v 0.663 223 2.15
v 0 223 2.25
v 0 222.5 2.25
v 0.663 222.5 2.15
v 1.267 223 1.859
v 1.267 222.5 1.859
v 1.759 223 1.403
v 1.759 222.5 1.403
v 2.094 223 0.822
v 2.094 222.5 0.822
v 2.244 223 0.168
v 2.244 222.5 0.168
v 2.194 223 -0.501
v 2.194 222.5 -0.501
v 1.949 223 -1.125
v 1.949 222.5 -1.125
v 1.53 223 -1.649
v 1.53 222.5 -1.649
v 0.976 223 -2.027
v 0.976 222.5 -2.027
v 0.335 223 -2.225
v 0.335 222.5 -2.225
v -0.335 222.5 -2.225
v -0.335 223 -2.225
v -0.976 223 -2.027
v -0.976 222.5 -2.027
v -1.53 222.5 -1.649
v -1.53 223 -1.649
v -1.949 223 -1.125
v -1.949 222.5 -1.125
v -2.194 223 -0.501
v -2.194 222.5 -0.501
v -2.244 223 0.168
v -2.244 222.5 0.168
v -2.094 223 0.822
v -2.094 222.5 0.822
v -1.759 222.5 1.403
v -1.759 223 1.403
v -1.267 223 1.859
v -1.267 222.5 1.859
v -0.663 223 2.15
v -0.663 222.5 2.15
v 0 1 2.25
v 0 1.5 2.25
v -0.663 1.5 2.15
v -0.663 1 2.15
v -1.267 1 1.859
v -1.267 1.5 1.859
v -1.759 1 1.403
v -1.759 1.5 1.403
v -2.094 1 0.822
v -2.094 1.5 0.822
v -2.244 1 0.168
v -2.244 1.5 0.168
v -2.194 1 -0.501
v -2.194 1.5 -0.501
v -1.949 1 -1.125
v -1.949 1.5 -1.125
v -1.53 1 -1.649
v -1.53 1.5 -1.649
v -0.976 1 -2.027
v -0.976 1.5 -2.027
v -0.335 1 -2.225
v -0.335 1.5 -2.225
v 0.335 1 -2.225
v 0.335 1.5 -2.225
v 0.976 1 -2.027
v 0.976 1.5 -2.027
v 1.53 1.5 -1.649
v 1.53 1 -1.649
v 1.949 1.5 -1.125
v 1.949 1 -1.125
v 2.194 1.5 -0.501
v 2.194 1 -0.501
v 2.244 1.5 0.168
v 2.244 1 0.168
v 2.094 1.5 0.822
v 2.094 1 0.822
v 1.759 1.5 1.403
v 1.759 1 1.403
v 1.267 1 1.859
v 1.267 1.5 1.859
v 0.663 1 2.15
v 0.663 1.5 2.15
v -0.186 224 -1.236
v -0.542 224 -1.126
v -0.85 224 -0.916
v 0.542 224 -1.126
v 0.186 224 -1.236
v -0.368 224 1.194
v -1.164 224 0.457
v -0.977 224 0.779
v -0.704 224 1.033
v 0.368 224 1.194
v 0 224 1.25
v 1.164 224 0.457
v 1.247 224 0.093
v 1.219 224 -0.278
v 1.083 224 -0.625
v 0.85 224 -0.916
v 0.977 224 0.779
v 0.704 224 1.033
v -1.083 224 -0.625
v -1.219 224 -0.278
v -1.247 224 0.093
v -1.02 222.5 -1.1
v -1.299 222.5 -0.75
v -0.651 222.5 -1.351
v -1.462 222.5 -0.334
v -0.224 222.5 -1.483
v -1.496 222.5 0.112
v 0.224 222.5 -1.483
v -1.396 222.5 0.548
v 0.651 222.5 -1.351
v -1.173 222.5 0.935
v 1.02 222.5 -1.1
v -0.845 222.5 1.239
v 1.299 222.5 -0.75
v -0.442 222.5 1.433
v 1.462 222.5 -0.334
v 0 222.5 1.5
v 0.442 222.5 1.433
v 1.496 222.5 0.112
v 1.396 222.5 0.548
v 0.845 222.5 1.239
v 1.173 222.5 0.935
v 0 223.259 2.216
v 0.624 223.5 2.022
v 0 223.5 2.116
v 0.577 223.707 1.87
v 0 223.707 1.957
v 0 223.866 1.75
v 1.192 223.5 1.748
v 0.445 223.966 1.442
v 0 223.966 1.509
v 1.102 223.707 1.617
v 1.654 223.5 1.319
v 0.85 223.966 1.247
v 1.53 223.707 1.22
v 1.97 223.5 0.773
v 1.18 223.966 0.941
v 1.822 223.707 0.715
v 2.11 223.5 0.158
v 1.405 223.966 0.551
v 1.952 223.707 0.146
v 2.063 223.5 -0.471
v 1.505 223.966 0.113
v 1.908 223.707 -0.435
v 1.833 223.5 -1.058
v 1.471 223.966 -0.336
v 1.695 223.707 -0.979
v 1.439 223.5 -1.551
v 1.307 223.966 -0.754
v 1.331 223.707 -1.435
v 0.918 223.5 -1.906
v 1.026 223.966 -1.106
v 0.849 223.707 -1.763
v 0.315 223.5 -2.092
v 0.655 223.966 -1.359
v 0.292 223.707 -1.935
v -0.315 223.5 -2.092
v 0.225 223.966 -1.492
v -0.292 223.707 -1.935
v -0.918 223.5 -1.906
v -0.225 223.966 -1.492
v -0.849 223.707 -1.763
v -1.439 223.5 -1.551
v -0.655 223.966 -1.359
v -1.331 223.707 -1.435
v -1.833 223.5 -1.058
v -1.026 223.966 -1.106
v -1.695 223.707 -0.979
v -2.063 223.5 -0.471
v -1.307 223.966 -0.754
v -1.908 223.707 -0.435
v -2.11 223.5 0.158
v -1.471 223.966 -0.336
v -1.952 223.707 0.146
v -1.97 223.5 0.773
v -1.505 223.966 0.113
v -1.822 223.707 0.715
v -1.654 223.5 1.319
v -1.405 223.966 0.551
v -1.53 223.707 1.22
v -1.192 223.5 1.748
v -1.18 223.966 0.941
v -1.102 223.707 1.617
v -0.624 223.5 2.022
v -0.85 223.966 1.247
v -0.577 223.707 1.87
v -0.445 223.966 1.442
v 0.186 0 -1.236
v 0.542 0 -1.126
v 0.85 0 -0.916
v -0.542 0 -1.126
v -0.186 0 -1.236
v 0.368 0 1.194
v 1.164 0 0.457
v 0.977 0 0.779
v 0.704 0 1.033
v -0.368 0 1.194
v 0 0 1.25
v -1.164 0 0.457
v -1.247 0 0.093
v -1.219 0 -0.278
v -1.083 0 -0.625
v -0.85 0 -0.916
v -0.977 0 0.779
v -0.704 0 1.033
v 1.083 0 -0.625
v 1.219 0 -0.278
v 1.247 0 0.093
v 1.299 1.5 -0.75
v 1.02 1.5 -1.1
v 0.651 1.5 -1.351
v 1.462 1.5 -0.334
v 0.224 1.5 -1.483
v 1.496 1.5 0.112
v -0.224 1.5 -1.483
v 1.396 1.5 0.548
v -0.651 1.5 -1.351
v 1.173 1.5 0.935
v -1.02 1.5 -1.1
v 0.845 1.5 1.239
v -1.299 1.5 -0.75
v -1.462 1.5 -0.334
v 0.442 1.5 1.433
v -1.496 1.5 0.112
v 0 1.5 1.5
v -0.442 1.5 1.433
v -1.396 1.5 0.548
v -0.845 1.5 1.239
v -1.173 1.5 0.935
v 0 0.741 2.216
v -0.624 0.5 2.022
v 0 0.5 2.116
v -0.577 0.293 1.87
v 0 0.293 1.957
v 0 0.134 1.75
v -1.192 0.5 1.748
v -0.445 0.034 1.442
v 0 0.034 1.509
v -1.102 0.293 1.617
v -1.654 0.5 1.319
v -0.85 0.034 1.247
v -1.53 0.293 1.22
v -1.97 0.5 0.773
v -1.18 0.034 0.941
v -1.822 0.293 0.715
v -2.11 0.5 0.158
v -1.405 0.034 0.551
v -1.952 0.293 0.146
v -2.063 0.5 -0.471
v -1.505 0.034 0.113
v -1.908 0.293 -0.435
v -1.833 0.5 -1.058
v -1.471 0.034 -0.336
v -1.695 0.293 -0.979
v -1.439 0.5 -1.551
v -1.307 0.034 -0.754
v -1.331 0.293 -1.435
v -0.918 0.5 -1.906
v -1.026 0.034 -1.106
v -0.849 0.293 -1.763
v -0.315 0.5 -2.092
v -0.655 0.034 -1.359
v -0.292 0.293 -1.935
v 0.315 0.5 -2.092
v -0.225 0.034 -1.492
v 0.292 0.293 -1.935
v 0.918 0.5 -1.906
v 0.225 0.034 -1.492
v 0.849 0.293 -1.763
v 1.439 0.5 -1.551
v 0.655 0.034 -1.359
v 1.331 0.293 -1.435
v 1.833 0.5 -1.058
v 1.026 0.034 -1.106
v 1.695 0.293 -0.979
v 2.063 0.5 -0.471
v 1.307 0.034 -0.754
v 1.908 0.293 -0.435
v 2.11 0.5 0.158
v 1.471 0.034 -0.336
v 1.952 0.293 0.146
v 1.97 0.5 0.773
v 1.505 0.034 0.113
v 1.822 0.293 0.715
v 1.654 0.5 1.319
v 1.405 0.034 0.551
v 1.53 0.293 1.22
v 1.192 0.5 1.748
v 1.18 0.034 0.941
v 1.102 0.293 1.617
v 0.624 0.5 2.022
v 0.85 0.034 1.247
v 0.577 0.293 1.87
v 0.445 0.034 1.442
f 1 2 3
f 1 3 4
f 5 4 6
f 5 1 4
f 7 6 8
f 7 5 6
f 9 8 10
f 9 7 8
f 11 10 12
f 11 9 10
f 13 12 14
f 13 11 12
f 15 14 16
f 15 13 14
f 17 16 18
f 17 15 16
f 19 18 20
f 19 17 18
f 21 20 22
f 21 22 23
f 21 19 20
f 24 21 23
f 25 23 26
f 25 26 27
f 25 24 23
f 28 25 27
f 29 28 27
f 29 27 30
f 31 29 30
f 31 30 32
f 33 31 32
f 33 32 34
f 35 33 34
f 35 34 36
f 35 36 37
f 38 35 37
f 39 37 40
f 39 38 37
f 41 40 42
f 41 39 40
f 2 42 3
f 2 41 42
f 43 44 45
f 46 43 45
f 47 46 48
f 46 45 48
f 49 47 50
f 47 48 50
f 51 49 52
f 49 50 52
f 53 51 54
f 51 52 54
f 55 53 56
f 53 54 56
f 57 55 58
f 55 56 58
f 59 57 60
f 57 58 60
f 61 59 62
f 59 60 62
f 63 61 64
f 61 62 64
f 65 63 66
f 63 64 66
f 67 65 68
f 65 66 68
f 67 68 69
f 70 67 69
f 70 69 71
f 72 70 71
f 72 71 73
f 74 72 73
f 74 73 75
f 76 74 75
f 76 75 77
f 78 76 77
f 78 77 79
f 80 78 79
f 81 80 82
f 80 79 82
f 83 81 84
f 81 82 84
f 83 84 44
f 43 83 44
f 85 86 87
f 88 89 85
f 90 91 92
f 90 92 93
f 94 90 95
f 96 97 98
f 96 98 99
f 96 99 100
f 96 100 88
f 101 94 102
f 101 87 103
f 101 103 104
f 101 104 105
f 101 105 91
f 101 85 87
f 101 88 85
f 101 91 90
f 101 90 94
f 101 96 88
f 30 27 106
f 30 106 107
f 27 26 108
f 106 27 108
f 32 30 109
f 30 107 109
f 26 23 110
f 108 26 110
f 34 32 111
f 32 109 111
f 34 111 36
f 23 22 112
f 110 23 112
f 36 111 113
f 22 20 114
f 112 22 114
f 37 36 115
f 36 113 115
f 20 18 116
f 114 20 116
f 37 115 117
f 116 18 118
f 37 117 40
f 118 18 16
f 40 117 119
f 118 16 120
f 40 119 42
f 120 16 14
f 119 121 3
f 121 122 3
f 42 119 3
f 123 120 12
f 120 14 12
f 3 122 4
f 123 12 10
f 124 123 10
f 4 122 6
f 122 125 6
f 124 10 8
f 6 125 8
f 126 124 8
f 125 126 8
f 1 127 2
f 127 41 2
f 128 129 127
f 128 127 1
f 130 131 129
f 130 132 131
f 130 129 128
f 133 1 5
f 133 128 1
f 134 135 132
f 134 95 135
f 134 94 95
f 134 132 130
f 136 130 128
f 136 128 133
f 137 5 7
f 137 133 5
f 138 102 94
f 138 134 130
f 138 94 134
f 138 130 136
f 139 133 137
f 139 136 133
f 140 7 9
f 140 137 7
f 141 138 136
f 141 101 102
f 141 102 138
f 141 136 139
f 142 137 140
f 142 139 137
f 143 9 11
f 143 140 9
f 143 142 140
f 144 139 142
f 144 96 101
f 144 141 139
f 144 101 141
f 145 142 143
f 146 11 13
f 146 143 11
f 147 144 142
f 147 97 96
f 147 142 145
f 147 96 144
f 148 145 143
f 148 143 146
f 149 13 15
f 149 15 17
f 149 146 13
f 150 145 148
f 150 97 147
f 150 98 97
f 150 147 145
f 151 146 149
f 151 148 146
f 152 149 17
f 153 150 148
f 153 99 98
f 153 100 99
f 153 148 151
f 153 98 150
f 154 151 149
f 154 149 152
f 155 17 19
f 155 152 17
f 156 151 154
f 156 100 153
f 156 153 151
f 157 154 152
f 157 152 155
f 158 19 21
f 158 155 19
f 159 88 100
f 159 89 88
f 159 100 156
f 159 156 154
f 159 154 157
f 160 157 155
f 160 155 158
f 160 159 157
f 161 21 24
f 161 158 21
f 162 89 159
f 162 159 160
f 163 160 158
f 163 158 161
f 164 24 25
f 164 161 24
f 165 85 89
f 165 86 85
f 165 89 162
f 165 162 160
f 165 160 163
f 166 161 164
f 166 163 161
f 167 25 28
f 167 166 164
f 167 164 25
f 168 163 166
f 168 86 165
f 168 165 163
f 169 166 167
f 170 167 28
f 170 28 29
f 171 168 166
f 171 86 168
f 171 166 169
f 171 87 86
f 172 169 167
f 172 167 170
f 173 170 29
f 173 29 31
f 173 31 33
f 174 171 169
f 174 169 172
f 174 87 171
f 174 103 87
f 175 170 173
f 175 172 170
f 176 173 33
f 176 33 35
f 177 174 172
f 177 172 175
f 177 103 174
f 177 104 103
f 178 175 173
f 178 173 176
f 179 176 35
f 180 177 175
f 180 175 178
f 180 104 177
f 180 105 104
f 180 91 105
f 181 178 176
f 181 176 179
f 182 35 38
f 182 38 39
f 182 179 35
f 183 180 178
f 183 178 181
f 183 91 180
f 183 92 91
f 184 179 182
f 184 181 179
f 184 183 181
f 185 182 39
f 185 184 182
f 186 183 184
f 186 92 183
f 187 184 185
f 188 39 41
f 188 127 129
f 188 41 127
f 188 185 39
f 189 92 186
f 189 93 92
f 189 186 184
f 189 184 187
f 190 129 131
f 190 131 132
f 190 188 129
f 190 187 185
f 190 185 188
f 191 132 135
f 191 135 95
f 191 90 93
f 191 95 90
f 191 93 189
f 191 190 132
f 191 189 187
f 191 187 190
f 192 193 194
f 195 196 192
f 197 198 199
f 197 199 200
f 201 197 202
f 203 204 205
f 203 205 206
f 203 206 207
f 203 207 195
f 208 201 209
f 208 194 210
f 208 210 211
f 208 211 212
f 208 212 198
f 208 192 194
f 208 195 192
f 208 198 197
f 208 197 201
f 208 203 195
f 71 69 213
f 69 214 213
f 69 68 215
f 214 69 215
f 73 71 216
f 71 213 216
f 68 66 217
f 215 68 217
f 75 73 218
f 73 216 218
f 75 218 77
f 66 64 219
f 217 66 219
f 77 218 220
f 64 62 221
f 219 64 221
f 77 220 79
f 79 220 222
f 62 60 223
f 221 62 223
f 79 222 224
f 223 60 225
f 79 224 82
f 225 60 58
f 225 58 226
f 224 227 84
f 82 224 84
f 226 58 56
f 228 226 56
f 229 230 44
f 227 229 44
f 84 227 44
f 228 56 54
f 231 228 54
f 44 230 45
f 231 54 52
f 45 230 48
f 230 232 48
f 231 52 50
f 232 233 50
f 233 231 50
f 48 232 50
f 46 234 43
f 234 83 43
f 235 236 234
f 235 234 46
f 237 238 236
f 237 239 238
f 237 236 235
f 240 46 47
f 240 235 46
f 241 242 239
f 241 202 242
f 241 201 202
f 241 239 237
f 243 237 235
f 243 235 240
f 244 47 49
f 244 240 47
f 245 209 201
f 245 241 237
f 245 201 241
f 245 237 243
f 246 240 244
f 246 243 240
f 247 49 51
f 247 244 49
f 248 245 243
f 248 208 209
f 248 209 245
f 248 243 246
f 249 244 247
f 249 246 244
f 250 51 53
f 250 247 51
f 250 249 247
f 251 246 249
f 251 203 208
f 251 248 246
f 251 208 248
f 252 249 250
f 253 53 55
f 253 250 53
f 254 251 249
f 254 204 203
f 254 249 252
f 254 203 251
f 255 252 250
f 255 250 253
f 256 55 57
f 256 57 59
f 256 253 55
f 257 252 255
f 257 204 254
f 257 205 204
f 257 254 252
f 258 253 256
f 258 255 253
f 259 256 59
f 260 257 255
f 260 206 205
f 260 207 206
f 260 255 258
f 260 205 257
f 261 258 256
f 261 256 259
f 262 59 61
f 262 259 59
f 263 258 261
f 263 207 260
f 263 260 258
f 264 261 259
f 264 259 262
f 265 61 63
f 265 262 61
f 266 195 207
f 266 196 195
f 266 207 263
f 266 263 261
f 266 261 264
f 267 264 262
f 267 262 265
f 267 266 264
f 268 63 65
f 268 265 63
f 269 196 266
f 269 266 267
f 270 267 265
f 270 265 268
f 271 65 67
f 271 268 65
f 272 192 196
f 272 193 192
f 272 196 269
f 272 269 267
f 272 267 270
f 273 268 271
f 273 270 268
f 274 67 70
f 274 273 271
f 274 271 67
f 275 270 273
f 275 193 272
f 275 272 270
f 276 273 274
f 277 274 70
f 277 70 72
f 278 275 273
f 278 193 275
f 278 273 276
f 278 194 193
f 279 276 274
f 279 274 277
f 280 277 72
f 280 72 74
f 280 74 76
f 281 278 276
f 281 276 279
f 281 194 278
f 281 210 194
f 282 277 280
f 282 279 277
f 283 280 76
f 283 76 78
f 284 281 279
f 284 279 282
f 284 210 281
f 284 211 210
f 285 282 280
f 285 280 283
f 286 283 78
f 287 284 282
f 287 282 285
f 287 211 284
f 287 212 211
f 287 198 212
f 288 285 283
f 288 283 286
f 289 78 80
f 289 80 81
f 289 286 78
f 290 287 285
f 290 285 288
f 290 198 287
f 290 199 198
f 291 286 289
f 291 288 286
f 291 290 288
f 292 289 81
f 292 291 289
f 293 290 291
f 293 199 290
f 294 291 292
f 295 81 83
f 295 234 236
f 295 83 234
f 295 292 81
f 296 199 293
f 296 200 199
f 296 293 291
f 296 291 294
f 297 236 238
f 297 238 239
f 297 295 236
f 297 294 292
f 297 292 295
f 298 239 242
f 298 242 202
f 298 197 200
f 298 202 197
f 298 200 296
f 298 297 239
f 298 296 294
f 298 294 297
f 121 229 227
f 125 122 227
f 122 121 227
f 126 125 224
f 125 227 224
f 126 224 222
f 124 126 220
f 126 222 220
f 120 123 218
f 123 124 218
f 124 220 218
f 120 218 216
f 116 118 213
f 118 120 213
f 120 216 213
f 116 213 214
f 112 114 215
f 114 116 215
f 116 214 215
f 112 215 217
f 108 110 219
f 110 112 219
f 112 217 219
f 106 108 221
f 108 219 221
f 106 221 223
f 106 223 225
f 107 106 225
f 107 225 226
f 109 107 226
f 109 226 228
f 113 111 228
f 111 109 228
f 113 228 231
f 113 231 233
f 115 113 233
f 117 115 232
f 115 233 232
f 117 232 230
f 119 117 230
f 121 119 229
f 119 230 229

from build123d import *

# Parameters (mm, degrees)
SKETCH1_R           = 1.5
BOSS_EXTRUDE1_DEPTH = 224
SKETCH2_R           = 2.25
BOSS_EXTRUDE2_DEPTH = 1.5
FILLET1_R           = 1
BOSS_EXTRUDE3_START = -1.5
SKETCH3_R           = 2.25
BOSS_EXTRUDE3_DEPTH = 1.5
FILLET2_R           = 1


with BuildPart() as part:
    # Sketch1 → Boss-Extrude1 (new body)
    with BuildSketch(Plane(origin=(0, 0, 0), x_dir=(1, 0, 0), z_dir=(0, 1, 0))):
        with Locations(Location((0, 0, 0), (0, 0, 270))):
            Circle(SKETCH1_R)
    extrude(amount=BOSS_EXTRUDE1_DEPTH)

    # Sketch2 → Boss-Extrude2 (add)
    with BuildSketch(Plane(origin=(0, 224, 0), x_dir=(1, 0, 0), z_dir=(0, 1, 0))):
        with Locations(Location((0, 0, 0), (0, 0, 270))):
            Circle(SKETCH2_R)
    extrude(amount=-BOSS_EXTRUDE2_DEPTH)

    # Fillet1
    fillet1_edges = [part.edges().sort_by_distance(p)[0] for p in [
        (0, 224, -2.25),
    ]]
    fillet(fillet1_edges, radius=FILLET1_R)

    # Sketch3 → Boss-Extrude3 (add)
    with BuildSketch(Plane.XZ.offset(BOSS_EXTRUDE3_START)):
        with Locations(Location((0, 0, 0), (0, 0, 90))):
            Circle(SKETCH3_R)
    extrude(amount=BOSS_EXTRUDE3_DEPTH)

    # Fillet2
    fillet2_edges = [part.edges().sort_by_distance(p)[0] for p in [
        (0, 0, -2.25),
    ]]
    fillet(fillet2_edges, radius=FILLET2_R)


solid = part.part
